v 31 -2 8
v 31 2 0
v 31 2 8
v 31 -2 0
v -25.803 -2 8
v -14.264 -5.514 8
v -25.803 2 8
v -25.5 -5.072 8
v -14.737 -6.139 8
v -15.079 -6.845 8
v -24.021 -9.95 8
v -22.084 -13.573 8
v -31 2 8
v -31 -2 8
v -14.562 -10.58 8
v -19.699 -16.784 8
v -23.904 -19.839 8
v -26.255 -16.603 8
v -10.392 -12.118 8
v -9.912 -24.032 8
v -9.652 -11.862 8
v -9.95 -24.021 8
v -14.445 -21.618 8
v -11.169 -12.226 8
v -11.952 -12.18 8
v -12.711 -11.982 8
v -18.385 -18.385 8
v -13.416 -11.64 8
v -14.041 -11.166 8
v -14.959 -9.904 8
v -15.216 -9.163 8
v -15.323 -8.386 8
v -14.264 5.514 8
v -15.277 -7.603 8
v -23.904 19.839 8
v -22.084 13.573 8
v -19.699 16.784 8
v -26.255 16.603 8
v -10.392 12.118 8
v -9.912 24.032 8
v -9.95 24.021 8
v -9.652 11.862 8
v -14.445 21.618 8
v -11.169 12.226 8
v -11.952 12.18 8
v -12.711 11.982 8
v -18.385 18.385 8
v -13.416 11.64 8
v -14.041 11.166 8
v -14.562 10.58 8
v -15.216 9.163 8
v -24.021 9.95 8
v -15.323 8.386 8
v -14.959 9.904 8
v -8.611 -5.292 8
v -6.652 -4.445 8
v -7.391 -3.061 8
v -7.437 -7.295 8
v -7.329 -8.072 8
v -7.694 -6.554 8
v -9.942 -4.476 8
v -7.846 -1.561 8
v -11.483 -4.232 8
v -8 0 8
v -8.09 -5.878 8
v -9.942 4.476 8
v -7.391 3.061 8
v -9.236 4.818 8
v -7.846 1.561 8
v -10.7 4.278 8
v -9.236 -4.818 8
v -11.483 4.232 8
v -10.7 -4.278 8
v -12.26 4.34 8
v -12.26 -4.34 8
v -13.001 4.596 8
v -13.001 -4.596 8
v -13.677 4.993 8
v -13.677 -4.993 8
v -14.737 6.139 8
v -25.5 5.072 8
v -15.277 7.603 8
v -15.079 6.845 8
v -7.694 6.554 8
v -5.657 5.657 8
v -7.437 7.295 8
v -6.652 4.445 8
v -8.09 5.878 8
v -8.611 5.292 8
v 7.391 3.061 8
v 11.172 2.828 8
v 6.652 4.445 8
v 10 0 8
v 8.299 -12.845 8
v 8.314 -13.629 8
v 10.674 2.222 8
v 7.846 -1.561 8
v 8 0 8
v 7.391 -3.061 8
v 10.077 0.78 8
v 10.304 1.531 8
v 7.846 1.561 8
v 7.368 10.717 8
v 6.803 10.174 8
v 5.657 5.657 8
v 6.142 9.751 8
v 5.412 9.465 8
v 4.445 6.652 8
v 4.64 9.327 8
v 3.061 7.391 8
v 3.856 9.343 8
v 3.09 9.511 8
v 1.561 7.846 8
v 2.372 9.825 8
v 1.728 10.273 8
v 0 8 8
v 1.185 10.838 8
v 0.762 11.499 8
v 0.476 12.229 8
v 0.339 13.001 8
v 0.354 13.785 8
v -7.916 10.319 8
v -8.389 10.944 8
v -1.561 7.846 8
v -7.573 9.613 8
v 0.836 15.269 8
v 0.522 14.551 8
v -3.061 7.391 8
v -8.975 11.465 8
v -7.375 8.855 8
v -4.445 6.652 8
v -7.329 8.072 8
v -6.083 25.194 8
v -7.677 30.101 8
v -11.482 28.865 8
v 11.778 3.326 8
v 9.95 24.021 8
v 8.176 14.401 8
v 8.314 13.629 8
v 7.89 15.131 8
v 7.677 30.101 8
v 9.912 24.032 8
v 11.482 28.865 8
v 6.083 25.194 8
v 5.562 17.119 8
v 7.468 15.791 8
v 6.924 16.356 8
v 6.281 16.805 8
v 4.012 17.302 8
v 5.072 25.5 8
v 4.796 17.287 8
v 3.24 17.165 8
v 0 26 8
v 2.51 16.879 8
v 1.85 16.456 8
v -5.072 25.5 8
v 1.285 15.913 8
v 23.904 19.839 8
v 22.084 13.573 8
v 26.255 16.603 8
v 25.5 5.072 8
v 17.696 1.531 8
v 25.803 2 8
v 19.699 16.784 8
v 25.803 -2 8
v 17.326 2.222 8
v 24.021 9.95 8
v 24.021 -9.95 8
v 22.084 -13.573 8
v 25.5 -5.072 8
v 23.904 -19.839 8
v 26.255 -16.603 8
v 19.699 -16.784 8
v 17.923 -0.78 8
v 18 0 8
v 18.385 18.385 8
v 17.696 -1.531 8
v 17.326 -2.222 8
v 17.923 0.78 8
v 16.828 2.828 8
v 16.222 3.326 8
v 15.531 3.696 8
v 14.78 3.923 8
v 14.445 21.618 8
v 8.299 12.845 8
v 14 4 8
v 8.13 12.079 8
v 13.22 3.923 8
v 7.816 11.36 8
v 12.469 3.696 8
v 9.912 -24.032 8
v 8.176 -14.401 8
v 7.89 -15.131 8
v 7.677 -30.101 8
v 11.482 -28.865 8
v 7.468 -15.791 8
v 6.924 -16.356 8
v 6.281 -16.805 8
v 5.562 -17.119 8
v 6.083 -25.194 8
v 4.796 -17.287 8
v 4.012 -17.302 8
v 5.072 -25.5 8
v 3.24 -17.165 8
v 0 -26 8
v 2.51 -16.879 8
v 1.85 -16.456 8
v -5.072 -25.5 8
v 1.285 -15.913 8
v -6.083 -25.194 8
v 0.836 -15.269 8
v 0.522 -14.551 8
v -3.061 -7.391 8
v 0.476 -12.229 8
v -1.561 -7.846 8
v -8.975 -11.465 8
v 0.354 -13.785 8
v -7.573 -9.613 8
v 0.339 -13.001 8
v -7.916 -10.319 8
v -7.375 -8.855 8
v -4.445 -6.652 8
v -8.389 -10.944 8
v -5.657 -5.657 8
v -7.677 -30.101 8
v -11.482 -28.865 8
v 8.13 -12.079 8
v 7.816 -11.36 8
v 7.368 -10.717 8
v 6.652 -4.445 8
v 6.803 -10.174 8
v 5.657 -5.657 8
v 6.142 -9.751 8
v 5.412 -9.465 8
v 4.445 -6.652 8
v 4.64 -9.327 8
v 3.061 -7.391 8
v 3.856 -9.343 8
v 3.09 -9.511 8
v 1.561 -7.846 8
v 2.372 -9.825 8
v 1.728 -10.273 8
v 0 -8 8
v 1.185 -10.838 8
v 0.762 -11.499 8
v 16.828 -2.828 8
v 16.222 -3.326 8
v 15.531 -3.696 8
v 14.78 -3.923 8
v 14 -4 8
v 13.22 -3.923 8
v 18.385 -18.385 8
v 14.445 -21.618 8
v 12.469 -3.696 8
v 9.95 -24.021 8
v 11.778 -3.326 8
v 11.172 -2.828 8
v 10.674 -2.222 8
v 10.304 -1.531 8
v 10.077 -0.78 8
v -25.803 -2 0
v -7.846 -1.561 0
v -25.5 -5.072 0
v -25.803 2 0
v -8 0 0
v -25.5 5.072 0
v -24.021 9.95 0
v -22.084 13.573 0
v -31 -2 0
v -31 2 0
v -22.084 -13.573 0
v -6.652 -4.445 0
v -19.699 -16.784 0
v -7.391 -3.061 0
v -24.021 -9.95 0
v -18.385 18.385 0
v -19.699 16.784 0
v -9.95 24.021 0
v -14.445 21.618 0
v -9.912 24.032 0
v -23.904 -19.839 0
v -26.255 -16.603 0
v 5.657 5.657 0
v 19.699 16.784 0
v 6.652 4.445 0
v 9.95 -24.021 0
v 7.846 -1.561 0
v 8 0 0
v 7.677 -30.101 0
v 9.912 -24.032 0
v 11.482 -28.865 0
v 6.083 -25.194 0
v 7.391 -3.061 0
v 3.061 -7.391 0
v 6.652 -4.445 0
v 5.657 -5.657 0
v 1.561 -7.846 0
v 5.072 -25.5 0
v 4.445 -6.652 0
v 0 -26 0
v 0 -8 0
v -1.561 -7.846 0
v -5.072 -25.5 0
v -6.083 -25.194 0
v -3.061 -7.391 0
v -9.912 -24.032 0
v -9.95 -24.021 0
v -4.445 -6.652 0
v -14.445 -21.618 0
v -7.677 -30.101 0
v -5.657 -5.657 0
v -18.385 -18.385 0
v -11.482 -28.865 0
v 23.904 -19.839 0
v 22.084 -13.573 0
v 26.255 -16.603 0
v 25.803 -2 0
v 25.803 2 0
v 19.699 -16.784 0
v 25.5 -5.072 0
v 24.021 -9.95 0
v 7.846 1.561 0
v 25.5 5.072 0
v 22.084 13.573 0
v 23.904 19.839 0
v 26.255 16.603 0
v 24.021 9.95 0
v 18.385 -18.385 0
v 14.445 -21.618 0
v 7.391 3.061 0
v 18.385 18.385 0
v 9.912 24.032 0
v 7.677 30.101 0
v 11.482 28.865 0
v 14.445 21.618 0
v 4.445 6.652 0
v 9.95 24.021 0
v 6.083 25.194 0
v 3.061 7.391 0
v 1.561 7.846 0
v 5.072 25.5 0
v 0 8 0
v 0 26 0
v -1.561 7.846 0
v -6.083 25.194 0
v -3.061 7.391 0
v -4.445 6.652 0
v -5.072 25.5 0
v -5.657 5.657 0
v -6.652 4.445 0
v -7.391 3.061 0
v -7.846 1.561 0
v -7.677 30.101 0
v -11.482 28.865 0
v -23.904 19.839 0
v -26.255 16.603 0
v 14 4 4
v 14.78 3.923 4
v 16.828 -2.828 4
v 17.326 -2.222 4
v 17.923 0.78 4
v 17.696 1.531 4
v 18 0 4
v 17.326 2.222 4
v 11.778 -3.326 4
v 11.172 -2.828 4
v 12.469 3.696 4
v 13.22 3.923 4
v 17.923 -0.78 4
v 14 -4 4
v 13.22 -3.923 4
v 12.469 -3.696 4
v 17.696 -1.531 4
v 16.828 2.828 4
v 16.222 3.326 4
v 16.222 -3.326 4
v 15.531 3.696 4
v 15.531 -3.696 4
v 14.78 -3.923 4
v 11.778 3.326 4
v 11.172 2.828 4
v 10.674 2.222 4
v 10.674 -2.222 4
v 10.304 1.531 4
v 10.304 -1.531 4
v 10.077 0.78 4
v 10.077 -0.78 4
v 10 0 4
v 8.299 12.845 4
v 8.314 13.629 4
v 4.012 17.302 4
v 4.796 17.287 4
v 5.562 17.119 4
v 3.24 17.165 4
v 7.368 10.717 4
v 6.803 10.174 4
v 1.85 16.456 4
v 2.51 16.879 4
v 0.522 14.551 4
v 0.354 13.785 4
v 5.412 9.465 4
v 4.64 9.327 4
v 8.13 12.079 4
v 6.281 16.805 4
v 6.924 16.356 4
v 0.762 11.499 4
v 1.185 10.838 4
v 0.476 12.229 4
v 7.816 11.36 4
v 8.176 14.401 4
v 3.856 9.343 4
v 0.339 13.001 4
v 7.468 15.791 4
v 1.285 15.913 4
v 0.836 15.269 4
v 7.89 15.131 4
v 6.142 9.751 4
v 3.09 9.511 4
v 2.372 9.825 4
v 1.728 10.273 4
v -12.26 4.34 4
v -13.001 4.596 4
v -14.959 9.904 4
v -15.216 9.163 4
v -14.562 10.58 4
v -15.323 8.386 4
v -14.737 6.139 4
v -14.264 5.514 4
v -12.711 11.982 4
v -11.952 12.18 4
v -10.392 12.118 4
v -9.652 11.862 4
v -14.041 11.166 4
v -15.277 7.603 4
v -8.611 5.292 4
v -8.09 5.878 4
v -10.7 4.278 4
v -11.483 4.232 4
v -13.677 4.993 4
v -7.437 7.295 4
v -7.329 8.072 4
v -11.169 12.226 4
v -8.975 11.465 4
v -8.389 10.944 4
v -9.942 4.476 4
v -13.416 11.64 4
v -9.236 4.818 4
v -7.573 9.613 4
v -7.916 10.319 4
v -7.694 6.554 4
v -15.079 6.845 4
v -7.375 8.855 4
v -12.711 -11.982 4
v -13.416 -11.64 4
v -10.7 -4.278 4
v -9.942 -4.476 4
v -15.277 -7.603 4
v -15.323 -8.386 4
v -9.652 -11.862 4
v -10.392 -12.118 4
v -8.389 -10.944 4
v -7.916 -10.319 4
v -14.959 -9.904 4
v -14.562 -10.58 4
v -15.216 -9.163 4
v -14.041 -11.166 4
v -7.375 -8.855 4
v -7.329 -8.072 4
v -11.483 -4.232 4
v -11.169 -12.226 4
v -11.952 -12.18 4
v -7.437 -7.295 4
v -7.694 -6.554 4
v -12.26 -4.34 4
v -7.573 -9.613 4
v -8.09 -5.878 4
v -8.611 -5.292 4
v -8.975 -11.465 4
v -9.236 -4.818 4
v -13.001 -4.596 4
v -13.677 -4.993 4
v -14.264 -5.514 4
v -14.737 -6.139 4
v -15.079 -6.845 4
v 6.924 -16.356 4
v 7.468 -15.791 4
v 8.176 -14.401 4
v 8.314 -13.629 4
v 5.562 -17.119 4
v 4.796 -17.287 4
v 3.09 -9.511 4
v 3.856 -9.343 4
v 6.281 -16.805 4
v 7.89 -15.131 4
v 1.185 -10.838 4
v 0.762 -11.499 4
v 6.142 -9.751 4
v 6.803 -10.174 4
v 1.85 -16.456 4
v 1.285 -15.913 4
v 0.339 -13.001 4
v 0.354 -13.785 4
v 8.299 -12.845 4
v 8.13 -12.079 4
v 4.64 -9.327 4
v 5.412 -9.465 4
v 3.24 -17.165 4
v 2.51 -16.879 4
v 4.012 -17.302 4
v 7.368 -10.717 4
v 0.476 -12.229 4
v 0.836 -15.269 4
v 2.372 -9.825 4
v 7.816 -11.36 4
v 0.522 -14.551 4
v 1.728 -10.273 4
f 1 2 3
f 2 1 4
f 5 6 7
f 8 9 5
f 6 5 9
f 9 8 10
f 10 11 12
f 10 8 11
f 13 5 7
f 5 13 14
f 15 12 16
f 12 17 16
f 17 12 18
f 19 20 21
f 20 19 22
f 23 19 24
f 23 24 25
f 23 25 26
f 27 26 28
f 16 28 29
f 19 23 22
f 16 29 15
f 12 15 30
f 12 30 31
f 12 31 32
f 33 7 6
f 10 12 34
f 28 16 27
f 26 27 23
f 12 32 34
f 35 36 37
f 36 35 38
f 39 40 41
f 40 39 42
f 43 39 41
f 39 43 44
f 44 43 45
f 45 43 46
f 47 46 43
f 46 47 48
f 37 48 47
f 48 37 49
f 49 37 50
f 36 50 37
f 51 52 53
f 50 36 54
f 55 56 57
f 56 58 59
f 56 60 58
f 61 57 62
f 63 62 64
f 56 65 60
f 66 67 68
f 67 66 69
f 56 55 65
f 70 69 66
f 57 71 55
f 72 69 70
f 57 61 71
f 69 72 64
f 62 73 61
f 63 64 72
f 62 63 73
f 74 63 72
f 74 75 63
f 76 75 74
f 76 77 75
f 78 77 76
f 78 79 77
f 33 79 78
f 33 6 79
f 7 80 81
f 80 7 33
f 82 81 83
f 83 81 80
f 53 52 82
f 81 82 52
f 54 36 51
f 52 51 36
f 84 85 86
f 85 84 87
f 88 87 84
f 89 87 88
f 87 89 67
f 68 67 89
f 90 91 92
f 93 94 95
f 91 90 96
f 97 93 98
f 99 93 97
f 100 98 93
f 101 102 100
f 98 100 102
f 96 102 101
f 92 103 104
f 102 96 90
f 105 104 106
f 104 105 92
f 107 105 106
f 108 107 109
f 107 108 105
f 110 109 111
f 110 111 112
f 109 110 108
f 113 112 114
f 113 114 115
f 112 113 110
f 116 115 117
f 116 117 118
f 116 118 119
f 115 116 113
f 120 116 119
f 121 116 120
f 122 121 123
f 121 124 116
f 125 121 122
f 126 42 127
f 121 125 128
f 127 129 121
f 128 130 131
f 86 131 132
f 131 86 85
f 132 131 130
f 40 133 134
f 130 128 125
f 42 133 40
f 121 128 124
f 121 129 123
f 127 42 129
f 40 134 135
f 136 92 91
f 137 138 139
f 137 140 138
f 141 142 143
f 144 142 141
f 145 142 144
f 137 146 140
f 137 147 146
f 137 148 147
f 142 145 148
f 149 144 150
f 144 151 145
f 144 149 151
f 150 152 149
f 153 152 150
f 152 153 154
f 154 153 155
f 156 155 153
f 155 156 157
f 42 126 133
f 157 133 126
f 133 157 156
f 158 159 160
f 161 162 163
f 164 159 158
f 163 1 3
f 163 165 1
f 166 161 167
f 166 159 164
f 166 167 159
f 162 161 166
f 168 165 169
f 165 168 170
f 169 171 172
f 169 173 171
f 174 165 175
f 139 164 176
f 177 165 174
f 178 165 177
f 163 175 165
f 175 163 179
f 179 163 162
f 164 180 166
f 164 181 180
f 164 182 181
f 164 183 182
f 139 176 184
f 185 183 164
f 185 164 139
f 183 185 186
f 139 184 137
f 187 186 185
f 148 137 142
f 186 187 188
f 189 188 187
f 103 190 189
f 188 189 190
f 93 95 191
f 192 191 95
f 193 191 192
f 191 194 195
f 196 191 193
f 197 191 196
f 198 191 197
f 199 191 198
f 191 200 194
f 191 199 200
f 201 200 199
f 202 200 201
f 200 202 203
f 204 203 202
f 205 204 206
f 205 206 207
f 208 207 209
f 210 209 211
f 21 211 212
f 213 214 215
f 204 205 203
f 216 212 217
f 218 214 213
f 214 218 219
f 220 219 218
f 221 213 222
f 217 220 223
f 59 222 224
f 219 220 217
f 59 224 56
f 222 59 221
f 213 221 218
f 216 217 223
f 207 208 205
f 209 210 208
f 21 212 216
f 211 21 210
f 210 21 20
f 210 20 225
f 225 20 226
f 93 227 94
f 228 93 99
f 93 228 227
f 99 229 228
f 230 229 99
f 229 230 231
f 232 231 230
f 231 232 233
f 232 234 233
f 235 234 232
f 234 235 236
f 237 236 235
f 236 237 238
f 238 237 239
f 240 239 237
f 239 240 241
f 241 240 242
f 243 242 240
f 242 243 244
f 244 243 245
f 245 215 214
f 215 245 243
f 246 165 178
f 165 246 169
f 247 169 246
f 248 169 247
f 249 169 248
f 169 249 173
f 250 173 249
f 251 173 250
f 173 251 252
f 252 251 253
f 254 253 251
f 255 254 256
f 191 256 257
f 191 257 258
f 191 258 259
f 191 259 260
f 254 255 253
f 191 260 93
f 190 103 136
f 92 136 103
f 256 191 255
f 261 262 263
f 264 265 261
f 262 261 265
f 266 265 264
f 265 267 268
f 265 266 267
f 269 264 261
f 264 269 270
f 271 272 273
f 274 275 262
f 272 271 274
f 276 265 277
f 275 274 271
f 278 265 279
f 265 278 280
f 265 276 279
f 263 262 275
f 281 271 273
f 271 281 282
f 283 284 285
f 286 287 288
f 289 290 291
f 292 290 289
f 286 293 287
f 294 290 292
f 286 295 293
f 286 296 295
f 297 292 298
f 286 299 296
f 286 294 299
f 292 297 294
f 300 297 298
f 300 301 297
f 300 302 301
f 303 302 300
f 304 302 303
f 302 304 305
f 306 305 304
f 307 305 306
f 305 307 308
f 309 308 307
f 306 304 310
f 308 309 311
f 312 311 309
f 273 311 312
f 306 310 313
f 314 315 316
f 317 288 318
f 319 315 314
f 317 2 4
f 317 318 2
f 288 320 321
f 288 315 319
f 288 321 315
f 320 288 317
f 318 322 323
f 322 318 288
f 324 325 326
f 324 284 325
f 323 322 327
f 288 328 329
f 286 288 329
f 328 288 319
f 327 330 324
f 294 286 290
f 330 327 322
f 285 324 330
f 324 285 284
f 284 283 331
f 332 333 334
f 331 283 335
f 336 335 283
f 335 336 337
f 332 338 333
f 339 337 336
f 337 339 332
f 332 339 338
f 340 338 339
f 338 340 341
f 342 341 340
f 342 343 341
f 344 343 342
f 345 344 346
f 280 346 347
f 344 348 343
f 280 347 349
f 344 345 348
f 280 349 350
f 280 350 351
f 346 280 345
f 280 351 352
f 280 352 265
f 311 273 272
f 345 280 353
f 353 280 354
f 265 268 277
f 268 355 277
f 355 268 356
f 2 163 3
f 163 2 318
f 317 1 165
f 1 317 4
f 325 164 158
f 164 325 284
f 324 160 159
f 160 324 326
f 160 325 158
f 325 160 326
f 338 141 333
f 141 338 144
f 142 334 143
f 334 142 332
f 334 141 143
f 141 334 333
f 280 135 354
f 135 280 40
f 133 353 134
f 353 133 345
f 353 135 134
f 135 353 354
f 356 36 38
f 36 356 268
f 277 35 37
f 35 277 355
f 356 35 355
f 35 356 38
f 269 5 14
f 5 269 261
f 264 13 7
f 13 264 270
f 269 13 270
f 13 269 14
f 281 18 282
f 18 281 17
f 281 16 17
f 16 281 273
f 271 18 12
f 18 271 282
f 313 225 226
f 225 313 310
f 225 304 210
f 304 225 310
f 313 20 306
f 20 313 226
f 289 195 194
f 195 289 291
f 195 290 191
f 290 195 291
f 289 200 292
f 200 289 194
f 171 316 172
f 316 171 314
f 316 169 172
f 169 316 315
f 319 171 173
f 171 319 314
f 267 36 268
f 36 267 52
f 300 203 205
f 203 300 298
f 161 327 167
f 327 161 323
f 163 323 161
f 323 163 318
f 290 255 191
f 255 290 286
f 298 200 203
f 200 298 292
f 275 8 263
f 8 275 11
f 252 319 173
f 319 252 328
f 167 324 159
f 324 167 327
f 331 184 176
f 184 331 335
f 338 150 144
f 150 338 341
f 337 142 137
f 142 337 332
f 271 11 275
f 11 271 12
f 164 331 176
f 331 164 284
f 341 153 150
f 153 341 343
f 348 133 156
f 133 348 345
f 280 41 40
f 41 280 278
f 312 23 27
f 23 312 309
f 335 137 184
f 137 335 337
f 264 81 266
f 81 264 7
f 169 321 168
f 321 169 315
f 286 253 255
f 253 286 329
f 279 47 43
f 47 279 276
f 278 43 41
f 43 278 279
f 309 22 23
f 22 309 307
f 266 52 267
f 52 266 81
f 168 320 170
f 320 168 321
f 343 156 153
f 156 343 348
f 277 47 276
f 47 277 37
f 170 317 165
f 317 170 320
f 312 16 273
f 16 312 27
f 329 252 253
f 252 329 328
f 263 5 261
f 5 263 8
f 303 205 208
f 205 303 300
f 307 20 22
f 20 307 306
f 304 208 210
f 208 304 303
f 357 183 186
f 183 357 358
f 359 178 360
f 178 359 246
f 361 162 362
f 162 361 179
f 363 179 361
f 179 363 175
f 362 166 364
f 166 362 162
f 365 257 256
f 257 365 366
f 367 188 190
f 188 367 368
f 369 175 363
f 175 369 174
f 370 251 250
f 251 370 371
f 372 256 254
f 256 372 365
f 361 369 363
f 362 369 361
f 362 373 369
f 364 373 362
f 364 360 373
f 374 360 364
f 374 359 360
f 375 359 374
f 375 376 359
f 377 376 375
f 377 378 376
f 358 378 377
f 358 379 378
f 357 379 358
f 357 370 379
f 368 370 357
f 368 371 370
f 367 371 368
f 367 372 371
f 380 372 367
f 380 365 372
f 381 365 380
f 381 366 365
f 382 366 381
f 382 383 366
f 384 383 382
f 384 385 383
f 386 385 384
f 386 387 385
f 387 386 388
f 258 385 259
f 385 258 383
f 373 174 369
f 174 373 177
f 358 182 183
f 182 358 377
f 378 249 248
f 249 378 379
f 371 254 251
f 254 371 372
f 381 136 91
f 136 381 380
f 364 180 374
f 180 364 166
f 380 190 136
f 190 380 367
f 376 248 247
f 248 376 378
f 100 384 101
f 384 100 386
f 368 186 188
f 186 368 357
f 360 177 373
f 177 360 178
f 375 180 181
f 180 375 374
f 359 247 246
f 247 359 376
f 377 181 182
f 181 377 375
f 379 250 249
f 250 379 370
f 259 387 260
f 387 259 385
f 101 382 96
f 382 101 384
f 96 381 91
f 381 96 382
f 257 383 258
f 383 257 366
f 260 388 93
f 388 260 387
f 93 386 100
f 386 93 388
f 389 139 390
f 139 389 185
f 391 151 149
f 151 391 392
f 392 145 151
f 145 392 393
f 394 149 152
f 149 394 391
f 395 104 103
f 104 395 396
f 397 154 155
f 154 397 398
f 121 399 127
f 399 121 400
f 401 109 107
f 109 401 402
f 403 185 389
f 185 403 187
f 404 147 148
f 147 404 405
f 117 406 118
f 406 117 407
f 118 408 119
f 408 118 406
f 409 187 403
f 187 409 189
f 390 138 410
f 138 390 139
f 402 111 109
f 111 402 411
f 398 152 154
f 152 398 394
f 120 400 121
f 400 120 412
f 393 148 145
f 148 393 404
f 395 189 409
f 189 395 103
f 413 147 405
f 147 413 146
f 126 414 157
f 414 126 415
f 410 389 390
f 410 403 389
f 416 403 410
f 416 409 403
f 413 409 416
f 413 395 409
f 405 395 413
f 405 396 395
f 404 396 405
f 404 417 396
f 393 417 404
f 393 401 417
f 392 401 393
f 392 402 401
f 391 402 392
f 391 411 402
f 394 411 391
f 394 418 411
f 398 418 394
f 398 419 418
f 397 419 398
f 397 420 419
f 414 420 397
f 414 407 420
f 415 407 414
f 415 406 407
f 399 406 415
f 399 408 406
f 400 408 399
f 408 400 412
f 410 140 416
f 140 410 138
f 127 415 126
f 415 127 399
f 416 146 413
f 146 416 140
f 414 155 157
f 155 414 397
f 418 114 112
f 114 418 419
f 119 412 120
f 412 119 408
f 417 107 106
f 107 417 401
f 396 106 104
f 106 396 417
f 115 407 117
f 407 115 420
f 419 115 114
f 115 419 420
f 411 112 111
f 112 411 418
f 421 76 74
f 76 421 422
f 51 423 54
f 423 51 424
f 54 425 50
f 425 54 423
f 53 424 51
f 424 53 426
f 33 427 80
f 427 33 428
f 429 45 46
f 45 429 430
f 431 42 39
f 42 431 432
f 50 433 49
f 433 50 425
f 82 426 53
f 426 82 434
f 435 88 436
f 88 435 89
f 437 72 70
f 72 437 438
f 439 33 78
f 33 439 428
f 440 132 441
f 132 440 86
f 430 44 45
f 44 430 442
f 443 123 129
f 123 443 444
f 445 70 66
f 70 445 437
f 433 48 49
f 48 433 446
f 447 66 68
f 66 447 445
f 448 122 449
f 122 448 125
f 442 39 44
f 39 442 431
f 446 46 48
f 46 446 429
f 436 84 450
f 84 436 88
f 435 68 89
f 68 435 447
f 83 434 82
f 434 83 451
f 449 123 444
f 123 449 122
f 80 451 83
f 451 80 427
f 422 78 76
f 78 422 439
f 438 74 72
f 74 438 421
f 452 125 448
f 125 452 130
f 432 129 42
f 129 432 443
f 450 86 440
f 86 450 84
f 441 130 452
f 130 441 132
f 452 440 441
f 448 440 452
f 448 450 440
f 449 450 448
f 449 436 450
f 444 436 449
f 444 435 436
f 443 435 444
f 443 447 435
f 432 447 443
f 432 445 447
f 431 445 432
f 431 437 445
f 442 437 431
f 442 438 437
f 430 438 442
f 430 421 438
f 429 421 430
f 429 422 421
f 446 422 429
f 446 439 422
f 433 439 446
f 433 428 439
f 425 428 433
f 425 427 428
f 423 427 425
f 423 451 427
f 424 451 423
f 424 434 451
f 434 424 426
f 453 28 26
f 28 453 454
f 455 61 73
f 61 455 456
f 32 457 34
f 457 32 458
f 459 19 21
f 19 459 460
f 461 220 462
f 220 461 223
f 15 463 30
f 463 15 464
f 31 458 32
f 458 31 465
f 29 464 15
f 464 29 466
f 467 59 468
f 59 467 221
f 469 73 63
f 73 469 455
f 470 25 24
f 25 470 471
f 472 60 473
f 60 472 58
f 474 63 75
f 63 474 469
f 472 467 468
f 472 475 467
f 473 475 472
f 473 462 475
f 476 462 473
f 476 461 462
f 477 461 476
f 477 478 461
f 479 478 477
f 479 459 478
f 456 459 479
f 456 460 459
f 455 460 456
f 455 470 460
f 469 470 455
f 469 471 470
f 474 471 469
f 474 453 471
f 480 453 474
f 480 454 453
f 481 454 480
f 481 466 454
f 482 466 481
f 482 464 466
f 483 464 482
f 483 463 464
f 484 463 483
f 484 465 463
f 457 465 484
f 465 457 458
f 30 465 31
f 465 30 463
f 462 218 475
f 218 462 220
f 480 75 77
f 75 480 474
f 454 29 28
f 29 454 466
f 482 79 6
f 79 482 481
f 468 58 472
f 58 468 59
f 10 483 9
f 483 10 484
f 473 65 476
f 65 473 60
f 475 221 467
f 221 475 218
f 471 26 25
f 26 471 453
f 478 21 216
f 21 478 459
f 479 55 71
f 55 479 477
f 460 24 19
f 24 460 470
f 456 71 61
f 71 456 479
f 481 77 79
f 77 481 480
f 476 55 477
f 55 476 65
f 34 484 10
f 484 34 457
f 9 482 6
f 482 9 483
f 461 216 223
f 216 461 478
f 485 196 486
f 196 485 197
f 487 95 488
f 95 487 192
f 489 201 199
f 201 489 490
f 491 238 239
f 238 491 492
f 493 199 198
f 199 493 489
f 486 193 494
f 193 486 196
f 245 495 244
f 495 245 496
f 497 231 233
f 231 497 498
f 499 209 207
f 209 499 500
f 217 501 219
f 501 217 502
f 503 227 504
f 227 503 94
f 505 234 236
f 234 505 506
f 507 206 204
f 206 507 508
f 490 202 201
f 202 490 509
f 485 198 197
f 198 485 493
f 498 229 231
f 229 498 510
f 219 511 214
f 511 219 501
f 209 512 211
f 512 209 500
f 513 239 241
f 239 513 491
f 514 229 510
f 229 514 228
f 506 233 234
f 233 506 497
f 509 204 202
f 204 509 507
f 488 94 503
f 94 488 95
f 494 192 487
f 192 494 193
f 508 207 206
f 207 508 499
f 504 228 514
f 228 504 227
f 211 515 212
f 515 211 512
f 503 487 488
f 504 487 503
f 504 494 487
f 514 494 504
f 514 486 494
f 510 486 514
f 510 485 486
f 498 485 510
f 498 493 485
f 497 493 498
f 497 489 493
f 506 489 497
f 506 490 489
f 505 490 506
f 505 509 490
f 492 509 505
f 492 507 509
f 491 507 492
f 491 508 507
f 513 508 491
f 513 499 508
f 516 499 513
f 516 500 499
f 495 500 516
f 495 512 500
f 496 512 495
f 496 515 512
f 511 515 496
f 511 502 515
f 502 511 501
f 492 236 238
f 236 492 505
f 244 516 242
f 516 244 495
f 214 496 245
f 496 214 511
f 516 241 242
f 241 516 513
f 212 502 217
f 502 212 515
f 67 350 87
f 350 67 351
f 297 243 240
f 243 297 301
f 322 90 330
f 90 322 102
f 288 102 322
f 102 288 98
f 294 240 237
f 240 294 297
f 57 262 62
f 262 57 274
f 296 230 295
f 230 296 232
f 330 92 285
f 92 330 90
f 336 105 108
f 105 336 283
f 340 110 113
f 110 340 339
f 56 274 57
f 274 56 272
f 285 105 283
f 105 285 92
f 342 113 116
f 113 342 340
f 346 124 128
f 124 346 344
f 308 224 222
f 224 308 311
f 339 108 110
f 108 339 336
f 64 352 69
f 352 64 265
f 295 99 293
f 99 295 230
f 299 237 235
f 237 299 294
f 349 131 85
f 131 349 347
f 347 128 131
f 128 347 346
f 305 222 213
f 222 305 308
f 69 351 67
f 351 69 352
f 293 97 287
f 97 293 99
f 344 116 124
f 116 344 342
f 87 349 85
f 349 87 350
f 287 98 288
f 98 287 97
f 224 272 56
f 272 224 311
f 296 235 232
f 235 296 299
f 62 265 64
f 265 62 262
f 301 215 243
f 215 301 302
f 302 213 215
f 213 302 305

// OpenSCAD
$fn = 32;

// ----------------------------------------------------------------------
// Spur blank: lightened gear blank
// ----------------------------------------------------------------------

// --- parameters (mm) ---
disc_r = 26;              // blank root radius
disc_t = 8;               // blank thickness
n_teeth = 10;             // stub tooth count
tooth_w = 4;              // tooth width at the root
tooth_h = 5;              // tooth height above the root
bore_r = 8;               // central bore radius
ring_r = 14;              // lightening pocket ring radius
pocket_r = 4;             // lightening pocket radius

out_r = disc_r + tooth_h;  // tip radius
bbox_x = 62.0;  // measured width over the teeth
bbox_y = 60.2;  // measured depth over the teeth

difference() {
union() {
  cylinder(r = disc_r, h = disc_t);
  for (i = [0 : n_teeth - 1])
    rotate([0, 0, i * 360 / n_teeth])
      translate([disc_r - 1, -tooth_w / 2, 0])
        cube([tooth_h + 1, tooth_w, disc_t]);
}
  translate([0, 0, -1]) cylinder(r = bore_r, h = disc_t + 2);
  for (i = [0 : 5])
    rotate([0, 0, i * 72])
      translate([ring_r, 0, disc_t - 4])
        cylinder(r = pocket_r, h = 5);
}
